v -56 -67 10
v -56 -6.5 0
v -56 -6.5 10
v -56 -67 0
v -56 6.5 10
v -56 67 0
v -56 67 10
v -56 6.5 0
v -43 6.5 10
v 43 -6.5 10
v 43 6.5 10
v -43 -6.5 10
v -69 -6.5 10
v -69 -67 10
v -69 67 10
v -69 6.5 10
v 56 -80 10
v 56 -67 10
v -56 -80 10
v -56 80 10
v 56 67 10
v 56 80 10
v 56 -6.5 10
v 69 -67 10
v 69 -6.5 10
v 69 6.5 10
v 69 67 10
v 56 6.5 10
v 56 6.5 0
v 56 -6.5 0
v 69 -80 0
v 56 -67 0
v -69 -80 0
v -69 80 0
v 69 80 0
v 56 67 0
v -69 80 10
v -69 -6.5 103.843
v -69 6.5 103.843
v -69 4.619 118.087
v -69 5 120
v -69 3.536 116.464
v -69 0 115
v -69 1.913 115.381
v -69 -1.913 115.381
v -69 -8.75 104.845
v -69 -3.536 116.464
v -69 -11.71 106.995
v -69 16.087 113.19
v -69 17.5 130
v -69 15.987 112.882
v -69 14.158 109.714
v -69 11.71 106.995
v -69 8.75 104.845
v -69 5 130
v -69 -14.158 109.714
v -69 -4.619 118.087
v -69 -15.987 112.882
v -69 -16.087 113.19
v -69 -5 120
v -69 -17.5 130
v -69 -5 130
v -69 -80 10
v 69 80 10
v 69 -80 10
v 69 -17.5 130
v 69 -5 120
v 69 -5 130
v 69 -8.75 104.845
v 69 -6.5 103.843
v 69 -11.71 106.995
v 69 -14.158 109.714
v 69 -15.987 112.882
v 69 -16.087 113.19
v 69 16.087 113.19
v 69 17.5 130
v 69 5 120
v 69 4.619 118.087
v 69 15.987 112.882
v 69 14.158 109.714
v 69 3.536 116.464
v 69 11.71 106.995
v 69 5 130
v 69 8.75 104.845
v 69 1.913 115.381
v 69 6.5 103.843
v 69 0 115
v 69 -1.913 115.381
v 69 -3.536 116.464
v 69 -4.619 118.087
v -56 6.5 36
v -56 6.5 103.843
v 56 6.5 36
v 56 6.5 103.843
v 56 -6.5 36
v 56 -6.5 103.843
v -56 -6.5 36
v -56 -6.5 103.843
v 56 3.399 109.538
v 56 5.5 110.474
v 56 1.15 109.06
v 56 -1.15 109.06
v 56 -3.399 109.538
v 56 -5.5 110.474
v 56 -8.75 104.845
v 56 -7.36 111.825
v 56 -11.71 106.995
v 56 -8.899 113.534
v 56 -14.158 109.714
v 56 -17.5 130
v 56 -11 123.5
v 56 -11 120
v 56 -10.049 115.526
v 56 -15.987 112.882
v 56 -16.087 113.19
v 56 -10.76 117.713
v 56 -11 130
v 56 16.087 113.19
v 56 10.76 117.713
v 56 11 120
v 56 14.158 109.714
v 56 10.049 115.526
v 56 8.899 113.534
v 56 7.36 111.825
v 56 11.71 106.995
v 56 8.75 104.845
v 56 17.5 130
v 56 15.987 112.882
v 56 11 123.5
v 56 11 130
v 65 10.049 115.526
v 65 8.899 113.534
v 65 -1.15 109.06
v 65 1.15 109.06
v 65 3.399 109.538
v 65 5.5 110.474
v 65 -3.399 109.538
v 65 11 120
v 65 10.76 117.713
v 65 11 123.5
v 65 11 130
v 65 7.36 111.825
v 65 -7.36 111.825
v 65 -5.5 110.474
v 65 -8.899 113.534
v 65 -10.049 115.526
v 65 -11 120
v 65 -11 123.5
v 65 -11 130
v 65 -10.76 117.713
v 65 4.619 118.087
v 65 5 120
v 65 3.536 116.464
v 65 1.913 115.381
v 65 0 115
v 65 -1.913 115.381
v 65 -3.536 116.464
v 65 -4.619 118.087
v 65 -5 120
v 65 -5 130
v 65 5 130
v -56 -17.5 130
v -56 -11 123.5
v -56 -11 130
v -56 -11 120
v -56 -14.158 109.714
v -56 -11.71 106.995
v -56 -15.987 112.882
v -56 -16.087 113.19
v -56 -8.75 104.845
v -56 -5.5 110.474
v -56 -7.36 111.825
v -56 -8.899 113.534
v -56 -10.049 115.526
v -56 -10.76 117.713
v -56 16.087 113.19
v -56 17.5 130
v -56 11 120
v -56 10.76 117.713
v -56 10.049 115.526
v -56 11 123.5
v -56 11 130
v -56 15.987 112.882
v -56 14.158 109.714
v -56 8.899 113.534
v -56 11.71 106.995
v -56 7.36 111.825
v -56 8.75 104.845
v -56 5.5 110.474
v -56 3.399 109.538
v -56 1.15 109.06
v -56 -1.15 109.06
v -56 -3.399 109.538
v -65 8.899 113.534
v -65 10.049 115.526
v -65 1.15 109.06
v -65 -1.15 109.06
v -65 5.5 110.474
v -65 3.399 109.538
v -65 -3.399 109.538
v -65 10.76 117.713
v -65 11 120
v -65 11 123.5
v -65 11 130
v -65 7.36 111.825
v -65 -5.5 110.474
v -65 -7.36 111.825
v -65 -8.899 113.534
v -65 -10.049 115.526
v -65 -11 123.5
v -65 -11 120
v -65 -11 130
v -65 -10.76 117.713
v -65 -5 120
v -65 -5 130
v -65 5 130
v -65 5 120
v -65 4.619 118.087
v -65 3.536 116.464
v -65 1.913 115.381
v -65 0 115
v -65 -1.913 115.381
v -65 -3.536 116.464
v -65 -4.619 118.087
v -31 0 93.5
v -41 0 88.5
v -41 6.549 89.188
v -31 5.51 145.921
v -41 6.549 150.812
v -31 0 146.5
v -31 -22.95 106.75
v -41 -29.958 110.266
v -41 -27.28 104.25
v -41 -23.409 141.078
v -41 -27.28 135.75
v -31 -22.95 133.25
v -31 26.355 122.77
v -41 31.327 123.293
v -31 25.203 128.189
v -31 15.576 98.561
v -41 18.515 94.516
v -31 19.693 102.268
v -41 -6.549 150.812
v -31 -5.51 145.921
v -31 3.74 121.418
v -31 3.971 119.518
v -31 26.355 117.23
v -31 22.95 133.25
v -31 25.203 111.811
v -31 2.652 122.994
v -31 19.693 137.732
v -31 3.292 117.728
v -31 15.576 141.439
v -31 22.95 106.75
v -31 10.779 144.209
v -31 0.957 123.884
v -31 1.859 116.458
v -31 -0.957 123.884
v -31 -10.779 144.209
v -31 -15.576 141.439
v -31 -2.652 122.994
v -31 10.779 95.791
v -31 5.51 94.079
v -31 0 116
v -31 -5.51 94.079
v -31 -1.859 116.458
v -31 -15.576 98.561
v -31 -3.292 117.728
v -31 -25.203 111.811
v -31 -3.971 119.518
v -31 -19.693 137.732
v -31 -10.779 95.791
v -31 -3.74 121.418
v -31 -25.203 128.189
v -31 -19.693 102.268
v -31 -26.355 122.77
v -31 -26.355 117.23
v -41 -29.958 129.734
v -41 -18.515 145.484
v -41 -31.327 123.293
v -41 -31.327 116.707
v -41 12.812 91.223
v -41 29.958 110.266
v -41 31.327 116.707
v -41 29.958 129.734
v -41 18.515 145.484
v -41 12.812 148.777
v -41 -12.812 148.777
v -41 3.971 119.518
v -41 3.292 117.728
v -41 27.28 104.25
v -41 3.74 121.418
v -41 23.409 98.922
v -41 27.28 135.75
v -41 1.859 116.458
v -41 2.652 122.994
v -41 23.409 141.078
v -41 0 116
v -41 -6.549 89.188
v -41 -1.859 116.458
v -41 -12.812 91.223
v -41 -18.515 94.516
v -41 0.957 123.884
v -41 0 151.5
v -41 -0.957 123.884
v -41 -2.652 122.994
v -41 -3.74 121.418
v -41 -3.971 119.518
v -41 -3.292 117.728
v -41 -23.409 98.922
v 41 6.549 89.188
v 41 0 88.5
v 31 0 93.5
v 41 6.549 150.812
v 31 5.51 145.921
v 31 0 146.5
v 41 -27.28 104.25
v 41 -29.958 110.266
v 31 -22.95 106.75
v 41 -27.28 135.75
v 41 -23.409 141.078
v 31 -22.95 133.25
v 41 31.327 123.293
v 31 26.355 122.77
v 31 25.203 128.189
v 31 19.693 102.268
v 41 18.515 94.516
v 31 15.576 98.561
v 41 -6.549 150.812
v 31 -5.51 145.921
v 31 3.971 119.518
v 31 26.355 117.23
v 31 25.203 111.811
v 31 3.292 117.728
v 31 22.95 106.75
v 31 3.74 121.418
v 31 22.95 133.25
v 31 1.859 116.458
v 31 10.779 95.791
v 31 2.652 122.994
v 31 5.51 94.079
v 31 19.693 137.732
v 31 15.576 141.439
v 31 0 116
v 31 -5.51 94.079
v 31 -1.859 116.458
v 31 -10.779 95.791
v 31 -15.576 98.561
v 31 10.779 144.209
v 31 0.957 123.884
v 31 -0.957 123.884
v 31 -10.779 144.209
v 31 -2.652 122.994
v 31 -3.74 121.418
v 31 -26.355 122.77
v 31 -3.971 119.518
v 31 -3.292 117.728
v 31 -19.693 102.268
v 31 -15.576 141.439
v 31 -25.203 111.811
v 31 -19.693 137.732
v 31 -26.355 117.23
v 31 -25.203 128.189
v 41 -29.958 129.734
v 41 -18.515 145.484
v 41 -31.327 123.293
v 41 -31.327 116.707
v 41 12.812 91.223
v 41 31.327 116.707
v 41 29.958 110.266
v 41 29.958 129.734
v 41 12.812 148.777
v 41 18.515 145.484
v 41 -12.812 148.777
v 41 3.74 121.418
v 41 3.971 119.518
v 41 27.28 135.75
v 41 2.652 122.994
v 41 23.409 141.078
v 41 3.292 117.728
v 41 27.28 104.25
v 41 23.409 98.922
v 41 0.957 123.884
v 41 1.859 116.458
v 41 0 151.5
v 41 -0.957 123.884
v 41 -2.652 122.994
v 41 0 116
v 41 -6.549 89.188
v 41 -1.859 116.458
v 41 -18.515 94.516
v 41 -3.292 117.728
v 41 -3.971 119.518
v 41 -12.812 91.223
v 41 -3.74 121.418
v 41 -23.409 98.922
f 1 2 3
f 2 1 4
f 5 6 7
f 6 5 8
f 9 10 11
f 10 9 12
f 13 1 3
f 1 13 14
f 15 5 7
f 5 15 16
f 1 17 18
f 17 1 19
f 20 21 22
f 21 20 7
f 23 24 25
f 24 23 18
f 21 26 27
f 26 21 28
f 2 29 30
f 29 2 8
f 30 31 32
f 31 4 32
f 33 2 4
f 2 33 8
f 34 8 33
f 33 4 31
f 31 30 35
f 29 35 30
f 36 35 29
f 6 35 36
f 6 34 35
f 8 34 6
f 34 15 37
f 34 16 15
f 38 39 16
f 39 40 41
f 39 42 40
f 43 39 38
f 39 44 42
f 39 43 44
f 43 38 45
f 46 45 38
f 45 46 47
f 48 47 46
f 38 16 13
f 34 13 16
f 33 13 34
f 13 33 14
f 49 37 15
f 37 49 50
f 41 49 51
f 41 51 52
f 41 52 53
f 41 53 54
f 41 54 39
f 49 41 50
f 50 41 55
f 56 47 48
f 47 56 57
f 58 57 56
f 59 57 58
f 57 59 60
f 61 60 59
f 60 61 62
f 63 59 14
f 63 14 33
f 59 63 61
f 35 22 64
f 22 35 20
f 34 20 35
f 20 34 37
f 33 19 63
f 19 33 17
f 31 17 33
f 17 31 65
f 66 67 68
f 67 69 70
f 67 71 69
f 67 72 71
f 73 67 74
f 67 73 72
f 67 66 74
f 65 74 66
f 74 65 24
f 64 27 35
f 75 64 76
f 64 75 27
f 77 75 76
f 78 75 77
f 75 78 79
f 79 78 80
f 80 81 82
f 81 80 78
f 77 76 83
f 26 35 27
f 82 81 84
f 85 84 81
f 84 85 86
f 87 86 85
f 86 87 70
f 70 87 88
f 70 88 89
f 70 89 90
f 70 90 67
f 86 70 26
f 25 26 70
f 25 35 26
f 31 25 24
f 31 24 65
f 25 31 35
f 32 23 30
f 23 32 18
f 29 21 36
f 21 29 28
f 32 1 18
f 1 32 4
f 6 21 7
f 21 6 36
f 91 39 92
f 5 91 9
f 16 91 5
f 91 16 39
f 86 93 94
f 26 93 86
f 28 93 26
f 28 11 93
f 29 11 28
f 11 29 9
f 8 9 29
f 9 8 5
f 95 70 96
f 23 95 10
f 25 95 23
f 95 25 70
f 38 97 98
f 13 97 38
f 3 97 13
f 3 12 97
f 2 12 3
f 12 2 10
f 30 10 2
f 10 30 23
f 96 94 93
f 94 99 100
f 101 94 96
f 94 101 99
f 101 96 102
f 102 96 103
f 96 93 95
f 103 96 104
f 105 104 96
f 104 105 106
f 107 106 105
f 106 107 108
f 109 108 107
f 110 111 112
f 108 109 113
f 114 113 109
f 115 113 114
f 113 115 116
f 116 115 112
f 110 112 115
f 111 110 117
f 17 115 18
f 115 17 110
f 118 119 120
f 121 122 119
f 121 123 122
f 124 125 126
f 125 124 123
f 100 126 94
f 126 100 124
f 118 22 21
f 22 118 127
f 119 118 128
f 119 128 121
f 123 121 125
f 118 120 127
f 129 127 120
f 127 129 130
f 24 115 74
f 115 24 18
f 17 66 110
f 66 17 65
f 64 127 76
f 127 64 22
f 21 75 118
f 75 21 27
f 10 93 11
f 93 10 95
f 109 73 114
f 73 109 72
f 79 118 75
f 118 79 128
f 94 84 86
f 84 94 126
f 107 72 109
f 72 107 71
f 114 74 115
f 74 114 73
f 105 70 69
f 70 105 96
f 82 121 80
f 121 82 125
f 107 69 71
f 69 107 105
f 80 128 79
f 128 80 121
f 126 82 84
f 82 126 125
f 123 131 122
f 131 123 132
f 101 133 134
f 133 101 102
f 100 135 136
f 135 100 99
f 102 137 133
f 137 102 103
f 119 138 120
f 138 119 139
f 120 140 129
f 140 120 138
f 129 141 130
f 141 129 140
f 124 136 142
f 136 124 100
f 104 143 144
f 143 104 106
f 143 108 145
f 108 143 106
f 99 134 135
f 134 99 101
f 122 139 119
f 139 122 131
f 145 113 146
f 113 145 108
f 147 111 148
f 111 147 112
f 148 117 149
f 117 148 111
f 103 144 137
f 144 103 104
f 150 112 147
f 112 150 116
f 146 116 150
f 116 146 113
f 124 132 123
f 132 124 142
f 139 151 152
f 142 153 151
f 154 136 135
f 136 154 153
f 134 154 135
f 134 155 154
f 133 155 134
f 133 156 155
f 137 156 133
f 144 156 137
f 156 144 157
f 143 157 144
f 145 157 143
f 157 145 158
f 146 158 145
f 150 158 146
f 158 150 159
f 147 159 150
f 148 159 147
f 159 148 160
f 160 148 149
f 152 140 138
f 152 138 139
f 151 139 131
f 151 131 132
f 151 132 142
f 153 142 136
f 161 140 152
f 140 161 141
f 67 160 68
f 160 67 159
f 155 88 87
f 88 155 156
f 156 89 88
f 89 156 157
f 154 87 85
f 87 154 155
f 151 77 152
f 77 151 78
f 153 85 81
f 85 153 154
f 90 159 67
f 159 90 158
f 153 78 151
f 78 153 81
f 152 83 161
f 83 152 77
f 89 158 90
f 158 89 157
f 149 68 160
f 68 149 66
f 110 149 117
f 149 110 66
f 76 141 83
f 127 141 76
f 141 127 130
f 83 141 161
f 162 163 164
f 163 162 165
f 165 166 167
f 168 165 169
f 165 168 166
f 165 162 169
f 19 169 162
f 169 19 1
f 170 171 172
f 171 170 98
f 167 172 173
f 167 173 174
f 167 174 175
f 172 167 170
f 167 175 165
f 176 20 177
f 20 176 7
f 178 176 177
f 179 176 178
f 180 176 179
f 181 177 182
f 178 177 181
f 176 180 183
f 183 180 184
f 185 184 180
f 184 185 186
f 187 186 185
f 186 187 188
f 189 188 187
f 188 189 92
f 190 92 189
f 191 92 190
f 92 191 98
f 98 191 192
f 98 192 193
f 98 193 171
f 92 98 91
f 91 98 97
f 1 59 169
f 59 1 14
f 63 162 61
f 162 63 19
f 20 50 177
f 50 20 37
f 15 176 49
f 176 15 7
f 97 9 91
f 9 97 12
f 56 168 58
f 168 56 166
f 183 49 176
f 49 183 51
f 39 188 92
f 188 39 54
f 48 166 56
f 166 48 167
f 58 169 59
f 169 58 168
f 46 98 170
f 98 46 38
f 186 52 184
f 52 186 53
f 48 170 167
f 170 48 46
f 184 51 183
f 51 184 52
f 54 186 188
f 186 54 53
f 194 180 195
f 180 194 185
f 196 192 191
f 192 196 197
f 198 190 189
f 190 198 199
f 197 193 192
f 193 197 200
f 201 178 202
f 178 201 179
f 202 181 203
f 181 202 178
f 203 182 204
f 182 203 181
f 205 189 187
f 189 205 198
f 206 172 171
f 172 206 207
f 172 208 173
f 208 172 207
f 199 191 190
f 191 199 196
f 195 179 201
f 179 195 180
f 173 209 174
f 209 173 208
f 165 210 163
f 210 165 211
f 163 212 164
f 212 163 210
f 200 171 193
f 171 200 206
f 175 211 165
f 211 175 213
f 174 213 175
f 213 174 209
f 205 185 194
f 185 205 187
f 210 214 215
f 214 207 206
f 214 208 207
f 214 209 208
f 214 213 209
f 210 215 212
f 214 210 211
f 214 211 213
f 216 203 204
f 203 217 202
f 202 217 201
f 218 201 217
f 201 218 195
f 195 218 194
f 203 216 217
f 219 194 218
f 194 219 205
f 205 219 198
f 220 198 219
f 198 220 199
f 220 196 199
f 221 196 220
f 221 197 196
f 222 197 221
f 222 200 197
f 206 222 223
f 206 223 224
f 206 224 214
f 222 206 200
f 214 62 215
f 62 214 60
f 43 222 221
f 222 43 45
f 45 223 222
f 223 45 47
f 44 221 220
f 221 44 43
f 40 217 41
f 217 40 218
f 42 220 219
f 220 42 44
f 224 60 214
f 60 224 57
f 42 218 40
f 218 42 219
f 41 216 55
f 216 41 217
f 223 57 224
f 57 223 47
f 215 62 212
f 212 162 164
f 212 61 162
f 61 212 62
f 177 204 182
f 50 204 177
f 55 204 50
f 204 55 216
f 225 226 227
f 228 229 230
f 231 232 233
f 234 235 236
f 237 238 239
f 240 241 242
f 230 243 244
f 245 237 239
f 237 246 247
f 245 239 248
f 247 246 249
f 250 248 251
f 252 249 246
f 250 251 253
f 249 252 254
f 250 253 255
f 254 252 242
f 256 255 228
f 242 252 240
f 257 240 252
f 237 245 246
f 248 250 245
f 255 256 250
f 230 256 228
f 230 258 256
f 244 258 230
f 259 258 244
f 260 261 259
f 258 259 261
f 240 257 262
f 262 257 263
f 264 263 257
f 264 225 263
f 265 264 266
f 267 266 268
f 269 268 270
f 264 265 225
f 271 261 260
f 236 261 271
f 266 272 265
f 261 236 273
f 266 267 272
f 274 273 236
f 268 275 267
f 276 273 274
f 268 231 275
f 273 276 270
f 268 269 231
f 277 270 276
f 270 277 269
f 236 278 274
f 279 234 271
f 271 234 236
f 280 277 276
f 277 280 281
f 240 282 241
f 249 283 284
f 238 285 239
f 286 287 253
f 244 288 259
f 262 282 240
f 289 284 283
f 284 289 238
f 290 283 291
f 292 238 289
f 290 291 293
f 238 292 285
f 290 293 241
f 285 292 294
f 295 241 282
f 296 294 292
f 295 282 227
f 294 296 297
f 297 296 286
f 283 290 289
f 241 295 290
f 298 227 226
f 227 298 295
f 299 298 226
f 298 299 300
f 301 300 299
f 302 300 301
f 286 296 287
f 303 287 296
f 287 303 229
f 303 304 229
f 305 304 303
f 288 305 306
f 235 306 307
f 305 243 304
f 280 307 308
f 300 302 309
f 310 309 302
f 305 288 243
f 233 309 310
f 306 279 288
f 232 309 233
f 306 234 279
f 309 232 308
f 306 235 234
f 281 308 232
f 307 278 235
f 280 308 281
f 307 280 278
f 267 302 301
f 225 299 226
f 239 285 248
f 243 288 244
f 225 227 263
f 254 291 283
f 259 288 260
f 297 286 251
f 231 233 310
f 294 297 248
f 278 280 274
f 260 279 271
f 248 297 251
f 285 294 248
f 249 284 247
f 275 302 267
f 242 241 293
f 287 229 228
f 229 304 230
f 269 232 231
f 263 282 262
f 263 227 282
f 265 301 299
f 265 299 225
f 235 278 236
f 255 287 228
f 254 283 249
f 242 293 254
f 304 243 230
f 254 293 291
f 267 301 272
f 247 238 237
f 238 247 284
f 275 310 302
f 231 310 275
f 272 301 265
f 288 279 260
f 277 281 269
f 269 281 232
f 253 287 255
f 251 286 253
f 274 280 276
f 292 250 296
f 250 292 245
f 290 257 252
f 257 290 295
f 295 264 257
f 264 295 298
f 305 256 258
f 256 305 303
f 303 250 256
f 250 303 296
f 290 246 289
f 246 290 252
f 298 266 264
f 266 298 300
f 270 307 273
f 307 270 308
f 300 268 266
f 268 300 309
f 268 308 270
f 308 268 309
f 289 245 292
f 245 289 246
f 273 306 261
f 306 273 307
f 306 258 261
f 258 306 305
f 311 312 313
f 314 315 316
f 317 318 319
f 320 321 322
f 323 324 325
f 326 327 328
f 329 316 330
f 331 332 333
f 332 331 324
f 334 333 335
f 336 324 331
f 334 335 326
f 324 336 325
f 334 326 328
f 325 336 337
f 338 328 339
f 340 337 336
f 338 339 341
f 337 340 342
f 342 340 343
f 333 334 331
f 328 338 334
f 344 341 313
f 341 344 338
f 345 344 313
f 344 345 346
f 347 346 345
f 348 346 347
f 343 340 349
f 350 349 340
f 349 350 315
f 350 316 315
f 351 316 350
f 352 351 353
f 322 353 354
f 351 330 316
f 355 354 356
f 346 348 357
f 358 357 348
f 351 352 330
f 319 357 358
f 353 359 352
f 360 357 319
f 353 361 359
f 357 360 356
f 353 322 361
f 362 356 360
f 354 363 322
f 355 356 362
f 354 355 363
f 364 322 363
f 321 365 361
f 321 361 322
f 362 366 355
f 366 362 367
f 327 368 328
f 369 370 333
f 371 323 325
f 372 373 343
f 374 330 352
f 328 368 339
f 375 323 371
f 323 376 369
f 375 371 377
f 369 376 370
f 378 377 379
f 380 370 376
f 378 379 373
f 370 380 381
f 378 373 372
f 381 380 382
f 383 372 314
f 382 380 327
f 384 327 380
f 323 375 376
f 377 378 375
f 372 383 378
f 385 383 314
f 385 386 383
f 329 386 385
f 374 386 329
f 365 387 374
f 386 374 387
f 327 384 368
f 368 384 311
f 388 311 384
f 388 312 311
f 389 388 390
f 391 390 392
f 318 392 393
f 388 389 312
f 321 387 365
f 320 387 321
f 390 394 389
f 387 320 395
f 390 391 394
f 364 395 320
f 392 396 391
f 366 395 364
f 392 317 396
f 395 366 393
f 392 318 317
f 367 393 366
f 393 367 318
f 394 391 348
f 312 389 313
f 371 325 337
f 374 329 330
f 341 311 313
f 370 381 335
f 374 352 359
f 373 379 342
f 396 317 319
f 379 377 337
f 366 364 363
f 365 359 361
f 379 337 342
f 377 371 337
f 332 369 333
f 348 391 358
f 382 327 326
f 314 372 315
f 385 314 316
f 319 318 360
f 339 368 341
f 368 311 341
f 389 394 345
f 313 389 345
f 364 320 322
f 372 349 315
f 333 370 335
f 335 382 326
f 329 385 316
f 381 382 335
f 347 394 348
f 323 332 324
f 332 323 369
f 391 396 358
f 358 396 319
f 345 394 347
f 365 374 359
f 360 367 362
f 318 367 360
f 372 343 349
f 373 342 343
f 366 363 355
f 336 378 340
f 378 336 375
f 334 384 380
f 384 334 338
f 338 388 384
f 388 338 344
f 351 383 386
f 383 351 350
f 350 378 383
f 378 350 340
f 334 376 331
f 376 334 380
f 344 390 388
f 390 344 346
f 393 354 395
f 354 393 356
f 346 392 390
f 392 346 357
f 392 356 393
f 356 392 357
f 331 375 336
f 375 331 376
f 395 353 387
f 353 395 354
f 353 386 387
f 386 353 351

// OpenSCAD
// file: fillamentHolder.scad
include <./common.scad>

holder_side_width=roller_width + 3;
holder_side_clearence=20;

holder_width = roll_width + (holder_side_clearence*2) + (holder_side_width * 2);
holder_base_height = 10;


module holder_tower() {
    tower_roll_center_height = roll_center_height - holder_base_height;
    holder_tower_height =  tower_roll_center_height + roller_diameter * 2;
    
    rotate([90, 0, 90])
    intersection(){
        
        translate([-holder_length/ 2, 0, -holder_side_width])
            cube([holder_length, roll_center_height, holder_side_width *2]);
        union(){
            union() {
                linear_extrude(holder_side_width)
                polygon([
                    [-roller_diameter/2 , roll_center_height - holder_side_width /2 ],
                    [-roller_diameter/2 - holder_side_width /2, roll_center_height ],
                    [-holder_length/2, 0],
                    [-holder_length /2 + holder_side_width, 0]
                ]);
                
                linear_extrude(holder_side_width)
                polygon([
                    [roller_diameter/2 , roll_center_height - holder_side_width /2 ],
                    [roller_diameter/2 + holder_side_width /2, roll_center_height ],
                    [holder_length/2, 0],
                    [holder_length /2 - holder_side_width, 0]
                ]);
                              
                linear_extrude(holder_side_width)
                polygon([
                    [- holder_side_width /2, tower_roll_center_height - roller_diameter/2],
                    [ holder_side_width /2, tower_roll_center_height - roller_diameter/2],
                    [holder_side_width /2, 0],
                    [- holder_side_width /2, 0]
                ]);
                
                translate([-holder_side_width/2,0,0])
                rotate([0,90,0])
                linear_extrude(holder_side_width)
                polygon([
                    [ holder_side_width, 0],
                    [0, 0],
                    [0, holder_side_width * 2]
                ]);
            }
            
            translate([0, tower_roll_center_height, 0])
                difference(){
                    hull(){
                        translate([0, roller_diameter, 0])
                            cylinder(holder_side_width, d= roller_diameter + holder_side_width );
                        cylinder(holder_side_width, d= roller_diameter + holder_side_width );
                    }
                    translate([0, 0, -1])
                    hull(){
                        translate([0, roller_diameter, 0])
                            roller();
                        roller();
                    }
                    
                   translate([0,0,-roller_width])
                    hull(){
                        translate([0, roller_diameter, 0])
                    cylinder(roller_width *3, d=roller_diameter_inner);
                    cylinder(roller_width *3, d=roller_diameter_inner);
                    }
                }
            }
    }
}

module holder_base(){
    
    translate([-holder_width/2, -holder_length/2, 0])
        cube([holder_side_width, holder_length, holder_base_height]);
    
    translate([holder_width/2 - holder_side_width, -holder_length/2, 0])
        cube([holder_side_width, holder_length, holder_base_height]);
    
    
    translate([-holder_width/2 , -holder_length/2, 0])
        cube([holder_width,  holder_side_width, holder_base_height]);
    translate([-holder_width/2 , holder_length/2- holder_side_width , 0])
        cube([holder_width,  holder_side_width, holder_base_height]);
    translate([-holder_width/2 , - holder_side_width/2 , 0])
        cube([holder_width,  holder_side_width, holder_base_height]);
}

module holder() {
        union() {
            holder_base();
                                    
            translate([holder_width/2 - holder_side_width, 0, holder_base_height])
                holder_tower();
            
            mirror([1, 0, 0])
            translate([holder_width/2 - holder_side_width, 0, holder_base_height])
                holder_tower();
        }
}
%
translate([ -roll_width/2, 0, roll_center_height])
rotate([0,90,0])
roll();

holder();
// file: fillamentRollAdapter.scad
include <./common.scad>

roll_adapter_diameter_clearence = 5;
roll_adapter_diameter_outer= roll_inner_diameter + roll_adapter_diameter_clearence;
roll_adapter_diameter_inner= roll_inner_diameter - roll_adapter_diameter_clearence;

module roll_adapter(){
    difference(){
       cylinder(roll_adapter_width, d1=roll_adapter_diameter_outer, d2=roll_adapter_diameter_inner);
        
        #
        translate([0,0,-roll_adapter_width])
        cylinder(roll_adapter_width *3, d=roller_width_inner);
    }
}

roll_adapter();
// file: common.scad
roll_diameter = 200;
roll_inner_diameter = 58;
roll_width = 72; 

roller_diameter= 22;
roller_diameter_inner= 10;
roller_width_inner=8;
roller_width = roller_width_inner + 2;

roll_center_height= roll_diameter/2 + 20;


holder_length = 160 ;
roll_adapter_width=10;

module roll() {
    difference(){
        cylinder(roll_width, d=roll_diameter);
        translate([0,0,-1])
            cylinder(roll_width+2, d=roll_inner_diameter);
    }
}

module roller(){
       cylinder(roller_width, d=roller_diameter);
}
// main file
include <./common.scad>
use <./fillamentRollAdapter.scad>
use <./fillamentHolder.scad>

%
translate([ -roll_width/2, 0, roll_center_height])
rotate([0,90,0])
roll();

holder();

translate([ -roll_width/2 - roll_adapter_width/2, 0, roll_center_height])
rotate([0,90,0])
roll_adapter();

mirror([1,0,0])
translate([ -roll_width/2 - roll_adapter_width/2, 0, roll_center_height])
rotate([0,90,0])
roll_adapter();
